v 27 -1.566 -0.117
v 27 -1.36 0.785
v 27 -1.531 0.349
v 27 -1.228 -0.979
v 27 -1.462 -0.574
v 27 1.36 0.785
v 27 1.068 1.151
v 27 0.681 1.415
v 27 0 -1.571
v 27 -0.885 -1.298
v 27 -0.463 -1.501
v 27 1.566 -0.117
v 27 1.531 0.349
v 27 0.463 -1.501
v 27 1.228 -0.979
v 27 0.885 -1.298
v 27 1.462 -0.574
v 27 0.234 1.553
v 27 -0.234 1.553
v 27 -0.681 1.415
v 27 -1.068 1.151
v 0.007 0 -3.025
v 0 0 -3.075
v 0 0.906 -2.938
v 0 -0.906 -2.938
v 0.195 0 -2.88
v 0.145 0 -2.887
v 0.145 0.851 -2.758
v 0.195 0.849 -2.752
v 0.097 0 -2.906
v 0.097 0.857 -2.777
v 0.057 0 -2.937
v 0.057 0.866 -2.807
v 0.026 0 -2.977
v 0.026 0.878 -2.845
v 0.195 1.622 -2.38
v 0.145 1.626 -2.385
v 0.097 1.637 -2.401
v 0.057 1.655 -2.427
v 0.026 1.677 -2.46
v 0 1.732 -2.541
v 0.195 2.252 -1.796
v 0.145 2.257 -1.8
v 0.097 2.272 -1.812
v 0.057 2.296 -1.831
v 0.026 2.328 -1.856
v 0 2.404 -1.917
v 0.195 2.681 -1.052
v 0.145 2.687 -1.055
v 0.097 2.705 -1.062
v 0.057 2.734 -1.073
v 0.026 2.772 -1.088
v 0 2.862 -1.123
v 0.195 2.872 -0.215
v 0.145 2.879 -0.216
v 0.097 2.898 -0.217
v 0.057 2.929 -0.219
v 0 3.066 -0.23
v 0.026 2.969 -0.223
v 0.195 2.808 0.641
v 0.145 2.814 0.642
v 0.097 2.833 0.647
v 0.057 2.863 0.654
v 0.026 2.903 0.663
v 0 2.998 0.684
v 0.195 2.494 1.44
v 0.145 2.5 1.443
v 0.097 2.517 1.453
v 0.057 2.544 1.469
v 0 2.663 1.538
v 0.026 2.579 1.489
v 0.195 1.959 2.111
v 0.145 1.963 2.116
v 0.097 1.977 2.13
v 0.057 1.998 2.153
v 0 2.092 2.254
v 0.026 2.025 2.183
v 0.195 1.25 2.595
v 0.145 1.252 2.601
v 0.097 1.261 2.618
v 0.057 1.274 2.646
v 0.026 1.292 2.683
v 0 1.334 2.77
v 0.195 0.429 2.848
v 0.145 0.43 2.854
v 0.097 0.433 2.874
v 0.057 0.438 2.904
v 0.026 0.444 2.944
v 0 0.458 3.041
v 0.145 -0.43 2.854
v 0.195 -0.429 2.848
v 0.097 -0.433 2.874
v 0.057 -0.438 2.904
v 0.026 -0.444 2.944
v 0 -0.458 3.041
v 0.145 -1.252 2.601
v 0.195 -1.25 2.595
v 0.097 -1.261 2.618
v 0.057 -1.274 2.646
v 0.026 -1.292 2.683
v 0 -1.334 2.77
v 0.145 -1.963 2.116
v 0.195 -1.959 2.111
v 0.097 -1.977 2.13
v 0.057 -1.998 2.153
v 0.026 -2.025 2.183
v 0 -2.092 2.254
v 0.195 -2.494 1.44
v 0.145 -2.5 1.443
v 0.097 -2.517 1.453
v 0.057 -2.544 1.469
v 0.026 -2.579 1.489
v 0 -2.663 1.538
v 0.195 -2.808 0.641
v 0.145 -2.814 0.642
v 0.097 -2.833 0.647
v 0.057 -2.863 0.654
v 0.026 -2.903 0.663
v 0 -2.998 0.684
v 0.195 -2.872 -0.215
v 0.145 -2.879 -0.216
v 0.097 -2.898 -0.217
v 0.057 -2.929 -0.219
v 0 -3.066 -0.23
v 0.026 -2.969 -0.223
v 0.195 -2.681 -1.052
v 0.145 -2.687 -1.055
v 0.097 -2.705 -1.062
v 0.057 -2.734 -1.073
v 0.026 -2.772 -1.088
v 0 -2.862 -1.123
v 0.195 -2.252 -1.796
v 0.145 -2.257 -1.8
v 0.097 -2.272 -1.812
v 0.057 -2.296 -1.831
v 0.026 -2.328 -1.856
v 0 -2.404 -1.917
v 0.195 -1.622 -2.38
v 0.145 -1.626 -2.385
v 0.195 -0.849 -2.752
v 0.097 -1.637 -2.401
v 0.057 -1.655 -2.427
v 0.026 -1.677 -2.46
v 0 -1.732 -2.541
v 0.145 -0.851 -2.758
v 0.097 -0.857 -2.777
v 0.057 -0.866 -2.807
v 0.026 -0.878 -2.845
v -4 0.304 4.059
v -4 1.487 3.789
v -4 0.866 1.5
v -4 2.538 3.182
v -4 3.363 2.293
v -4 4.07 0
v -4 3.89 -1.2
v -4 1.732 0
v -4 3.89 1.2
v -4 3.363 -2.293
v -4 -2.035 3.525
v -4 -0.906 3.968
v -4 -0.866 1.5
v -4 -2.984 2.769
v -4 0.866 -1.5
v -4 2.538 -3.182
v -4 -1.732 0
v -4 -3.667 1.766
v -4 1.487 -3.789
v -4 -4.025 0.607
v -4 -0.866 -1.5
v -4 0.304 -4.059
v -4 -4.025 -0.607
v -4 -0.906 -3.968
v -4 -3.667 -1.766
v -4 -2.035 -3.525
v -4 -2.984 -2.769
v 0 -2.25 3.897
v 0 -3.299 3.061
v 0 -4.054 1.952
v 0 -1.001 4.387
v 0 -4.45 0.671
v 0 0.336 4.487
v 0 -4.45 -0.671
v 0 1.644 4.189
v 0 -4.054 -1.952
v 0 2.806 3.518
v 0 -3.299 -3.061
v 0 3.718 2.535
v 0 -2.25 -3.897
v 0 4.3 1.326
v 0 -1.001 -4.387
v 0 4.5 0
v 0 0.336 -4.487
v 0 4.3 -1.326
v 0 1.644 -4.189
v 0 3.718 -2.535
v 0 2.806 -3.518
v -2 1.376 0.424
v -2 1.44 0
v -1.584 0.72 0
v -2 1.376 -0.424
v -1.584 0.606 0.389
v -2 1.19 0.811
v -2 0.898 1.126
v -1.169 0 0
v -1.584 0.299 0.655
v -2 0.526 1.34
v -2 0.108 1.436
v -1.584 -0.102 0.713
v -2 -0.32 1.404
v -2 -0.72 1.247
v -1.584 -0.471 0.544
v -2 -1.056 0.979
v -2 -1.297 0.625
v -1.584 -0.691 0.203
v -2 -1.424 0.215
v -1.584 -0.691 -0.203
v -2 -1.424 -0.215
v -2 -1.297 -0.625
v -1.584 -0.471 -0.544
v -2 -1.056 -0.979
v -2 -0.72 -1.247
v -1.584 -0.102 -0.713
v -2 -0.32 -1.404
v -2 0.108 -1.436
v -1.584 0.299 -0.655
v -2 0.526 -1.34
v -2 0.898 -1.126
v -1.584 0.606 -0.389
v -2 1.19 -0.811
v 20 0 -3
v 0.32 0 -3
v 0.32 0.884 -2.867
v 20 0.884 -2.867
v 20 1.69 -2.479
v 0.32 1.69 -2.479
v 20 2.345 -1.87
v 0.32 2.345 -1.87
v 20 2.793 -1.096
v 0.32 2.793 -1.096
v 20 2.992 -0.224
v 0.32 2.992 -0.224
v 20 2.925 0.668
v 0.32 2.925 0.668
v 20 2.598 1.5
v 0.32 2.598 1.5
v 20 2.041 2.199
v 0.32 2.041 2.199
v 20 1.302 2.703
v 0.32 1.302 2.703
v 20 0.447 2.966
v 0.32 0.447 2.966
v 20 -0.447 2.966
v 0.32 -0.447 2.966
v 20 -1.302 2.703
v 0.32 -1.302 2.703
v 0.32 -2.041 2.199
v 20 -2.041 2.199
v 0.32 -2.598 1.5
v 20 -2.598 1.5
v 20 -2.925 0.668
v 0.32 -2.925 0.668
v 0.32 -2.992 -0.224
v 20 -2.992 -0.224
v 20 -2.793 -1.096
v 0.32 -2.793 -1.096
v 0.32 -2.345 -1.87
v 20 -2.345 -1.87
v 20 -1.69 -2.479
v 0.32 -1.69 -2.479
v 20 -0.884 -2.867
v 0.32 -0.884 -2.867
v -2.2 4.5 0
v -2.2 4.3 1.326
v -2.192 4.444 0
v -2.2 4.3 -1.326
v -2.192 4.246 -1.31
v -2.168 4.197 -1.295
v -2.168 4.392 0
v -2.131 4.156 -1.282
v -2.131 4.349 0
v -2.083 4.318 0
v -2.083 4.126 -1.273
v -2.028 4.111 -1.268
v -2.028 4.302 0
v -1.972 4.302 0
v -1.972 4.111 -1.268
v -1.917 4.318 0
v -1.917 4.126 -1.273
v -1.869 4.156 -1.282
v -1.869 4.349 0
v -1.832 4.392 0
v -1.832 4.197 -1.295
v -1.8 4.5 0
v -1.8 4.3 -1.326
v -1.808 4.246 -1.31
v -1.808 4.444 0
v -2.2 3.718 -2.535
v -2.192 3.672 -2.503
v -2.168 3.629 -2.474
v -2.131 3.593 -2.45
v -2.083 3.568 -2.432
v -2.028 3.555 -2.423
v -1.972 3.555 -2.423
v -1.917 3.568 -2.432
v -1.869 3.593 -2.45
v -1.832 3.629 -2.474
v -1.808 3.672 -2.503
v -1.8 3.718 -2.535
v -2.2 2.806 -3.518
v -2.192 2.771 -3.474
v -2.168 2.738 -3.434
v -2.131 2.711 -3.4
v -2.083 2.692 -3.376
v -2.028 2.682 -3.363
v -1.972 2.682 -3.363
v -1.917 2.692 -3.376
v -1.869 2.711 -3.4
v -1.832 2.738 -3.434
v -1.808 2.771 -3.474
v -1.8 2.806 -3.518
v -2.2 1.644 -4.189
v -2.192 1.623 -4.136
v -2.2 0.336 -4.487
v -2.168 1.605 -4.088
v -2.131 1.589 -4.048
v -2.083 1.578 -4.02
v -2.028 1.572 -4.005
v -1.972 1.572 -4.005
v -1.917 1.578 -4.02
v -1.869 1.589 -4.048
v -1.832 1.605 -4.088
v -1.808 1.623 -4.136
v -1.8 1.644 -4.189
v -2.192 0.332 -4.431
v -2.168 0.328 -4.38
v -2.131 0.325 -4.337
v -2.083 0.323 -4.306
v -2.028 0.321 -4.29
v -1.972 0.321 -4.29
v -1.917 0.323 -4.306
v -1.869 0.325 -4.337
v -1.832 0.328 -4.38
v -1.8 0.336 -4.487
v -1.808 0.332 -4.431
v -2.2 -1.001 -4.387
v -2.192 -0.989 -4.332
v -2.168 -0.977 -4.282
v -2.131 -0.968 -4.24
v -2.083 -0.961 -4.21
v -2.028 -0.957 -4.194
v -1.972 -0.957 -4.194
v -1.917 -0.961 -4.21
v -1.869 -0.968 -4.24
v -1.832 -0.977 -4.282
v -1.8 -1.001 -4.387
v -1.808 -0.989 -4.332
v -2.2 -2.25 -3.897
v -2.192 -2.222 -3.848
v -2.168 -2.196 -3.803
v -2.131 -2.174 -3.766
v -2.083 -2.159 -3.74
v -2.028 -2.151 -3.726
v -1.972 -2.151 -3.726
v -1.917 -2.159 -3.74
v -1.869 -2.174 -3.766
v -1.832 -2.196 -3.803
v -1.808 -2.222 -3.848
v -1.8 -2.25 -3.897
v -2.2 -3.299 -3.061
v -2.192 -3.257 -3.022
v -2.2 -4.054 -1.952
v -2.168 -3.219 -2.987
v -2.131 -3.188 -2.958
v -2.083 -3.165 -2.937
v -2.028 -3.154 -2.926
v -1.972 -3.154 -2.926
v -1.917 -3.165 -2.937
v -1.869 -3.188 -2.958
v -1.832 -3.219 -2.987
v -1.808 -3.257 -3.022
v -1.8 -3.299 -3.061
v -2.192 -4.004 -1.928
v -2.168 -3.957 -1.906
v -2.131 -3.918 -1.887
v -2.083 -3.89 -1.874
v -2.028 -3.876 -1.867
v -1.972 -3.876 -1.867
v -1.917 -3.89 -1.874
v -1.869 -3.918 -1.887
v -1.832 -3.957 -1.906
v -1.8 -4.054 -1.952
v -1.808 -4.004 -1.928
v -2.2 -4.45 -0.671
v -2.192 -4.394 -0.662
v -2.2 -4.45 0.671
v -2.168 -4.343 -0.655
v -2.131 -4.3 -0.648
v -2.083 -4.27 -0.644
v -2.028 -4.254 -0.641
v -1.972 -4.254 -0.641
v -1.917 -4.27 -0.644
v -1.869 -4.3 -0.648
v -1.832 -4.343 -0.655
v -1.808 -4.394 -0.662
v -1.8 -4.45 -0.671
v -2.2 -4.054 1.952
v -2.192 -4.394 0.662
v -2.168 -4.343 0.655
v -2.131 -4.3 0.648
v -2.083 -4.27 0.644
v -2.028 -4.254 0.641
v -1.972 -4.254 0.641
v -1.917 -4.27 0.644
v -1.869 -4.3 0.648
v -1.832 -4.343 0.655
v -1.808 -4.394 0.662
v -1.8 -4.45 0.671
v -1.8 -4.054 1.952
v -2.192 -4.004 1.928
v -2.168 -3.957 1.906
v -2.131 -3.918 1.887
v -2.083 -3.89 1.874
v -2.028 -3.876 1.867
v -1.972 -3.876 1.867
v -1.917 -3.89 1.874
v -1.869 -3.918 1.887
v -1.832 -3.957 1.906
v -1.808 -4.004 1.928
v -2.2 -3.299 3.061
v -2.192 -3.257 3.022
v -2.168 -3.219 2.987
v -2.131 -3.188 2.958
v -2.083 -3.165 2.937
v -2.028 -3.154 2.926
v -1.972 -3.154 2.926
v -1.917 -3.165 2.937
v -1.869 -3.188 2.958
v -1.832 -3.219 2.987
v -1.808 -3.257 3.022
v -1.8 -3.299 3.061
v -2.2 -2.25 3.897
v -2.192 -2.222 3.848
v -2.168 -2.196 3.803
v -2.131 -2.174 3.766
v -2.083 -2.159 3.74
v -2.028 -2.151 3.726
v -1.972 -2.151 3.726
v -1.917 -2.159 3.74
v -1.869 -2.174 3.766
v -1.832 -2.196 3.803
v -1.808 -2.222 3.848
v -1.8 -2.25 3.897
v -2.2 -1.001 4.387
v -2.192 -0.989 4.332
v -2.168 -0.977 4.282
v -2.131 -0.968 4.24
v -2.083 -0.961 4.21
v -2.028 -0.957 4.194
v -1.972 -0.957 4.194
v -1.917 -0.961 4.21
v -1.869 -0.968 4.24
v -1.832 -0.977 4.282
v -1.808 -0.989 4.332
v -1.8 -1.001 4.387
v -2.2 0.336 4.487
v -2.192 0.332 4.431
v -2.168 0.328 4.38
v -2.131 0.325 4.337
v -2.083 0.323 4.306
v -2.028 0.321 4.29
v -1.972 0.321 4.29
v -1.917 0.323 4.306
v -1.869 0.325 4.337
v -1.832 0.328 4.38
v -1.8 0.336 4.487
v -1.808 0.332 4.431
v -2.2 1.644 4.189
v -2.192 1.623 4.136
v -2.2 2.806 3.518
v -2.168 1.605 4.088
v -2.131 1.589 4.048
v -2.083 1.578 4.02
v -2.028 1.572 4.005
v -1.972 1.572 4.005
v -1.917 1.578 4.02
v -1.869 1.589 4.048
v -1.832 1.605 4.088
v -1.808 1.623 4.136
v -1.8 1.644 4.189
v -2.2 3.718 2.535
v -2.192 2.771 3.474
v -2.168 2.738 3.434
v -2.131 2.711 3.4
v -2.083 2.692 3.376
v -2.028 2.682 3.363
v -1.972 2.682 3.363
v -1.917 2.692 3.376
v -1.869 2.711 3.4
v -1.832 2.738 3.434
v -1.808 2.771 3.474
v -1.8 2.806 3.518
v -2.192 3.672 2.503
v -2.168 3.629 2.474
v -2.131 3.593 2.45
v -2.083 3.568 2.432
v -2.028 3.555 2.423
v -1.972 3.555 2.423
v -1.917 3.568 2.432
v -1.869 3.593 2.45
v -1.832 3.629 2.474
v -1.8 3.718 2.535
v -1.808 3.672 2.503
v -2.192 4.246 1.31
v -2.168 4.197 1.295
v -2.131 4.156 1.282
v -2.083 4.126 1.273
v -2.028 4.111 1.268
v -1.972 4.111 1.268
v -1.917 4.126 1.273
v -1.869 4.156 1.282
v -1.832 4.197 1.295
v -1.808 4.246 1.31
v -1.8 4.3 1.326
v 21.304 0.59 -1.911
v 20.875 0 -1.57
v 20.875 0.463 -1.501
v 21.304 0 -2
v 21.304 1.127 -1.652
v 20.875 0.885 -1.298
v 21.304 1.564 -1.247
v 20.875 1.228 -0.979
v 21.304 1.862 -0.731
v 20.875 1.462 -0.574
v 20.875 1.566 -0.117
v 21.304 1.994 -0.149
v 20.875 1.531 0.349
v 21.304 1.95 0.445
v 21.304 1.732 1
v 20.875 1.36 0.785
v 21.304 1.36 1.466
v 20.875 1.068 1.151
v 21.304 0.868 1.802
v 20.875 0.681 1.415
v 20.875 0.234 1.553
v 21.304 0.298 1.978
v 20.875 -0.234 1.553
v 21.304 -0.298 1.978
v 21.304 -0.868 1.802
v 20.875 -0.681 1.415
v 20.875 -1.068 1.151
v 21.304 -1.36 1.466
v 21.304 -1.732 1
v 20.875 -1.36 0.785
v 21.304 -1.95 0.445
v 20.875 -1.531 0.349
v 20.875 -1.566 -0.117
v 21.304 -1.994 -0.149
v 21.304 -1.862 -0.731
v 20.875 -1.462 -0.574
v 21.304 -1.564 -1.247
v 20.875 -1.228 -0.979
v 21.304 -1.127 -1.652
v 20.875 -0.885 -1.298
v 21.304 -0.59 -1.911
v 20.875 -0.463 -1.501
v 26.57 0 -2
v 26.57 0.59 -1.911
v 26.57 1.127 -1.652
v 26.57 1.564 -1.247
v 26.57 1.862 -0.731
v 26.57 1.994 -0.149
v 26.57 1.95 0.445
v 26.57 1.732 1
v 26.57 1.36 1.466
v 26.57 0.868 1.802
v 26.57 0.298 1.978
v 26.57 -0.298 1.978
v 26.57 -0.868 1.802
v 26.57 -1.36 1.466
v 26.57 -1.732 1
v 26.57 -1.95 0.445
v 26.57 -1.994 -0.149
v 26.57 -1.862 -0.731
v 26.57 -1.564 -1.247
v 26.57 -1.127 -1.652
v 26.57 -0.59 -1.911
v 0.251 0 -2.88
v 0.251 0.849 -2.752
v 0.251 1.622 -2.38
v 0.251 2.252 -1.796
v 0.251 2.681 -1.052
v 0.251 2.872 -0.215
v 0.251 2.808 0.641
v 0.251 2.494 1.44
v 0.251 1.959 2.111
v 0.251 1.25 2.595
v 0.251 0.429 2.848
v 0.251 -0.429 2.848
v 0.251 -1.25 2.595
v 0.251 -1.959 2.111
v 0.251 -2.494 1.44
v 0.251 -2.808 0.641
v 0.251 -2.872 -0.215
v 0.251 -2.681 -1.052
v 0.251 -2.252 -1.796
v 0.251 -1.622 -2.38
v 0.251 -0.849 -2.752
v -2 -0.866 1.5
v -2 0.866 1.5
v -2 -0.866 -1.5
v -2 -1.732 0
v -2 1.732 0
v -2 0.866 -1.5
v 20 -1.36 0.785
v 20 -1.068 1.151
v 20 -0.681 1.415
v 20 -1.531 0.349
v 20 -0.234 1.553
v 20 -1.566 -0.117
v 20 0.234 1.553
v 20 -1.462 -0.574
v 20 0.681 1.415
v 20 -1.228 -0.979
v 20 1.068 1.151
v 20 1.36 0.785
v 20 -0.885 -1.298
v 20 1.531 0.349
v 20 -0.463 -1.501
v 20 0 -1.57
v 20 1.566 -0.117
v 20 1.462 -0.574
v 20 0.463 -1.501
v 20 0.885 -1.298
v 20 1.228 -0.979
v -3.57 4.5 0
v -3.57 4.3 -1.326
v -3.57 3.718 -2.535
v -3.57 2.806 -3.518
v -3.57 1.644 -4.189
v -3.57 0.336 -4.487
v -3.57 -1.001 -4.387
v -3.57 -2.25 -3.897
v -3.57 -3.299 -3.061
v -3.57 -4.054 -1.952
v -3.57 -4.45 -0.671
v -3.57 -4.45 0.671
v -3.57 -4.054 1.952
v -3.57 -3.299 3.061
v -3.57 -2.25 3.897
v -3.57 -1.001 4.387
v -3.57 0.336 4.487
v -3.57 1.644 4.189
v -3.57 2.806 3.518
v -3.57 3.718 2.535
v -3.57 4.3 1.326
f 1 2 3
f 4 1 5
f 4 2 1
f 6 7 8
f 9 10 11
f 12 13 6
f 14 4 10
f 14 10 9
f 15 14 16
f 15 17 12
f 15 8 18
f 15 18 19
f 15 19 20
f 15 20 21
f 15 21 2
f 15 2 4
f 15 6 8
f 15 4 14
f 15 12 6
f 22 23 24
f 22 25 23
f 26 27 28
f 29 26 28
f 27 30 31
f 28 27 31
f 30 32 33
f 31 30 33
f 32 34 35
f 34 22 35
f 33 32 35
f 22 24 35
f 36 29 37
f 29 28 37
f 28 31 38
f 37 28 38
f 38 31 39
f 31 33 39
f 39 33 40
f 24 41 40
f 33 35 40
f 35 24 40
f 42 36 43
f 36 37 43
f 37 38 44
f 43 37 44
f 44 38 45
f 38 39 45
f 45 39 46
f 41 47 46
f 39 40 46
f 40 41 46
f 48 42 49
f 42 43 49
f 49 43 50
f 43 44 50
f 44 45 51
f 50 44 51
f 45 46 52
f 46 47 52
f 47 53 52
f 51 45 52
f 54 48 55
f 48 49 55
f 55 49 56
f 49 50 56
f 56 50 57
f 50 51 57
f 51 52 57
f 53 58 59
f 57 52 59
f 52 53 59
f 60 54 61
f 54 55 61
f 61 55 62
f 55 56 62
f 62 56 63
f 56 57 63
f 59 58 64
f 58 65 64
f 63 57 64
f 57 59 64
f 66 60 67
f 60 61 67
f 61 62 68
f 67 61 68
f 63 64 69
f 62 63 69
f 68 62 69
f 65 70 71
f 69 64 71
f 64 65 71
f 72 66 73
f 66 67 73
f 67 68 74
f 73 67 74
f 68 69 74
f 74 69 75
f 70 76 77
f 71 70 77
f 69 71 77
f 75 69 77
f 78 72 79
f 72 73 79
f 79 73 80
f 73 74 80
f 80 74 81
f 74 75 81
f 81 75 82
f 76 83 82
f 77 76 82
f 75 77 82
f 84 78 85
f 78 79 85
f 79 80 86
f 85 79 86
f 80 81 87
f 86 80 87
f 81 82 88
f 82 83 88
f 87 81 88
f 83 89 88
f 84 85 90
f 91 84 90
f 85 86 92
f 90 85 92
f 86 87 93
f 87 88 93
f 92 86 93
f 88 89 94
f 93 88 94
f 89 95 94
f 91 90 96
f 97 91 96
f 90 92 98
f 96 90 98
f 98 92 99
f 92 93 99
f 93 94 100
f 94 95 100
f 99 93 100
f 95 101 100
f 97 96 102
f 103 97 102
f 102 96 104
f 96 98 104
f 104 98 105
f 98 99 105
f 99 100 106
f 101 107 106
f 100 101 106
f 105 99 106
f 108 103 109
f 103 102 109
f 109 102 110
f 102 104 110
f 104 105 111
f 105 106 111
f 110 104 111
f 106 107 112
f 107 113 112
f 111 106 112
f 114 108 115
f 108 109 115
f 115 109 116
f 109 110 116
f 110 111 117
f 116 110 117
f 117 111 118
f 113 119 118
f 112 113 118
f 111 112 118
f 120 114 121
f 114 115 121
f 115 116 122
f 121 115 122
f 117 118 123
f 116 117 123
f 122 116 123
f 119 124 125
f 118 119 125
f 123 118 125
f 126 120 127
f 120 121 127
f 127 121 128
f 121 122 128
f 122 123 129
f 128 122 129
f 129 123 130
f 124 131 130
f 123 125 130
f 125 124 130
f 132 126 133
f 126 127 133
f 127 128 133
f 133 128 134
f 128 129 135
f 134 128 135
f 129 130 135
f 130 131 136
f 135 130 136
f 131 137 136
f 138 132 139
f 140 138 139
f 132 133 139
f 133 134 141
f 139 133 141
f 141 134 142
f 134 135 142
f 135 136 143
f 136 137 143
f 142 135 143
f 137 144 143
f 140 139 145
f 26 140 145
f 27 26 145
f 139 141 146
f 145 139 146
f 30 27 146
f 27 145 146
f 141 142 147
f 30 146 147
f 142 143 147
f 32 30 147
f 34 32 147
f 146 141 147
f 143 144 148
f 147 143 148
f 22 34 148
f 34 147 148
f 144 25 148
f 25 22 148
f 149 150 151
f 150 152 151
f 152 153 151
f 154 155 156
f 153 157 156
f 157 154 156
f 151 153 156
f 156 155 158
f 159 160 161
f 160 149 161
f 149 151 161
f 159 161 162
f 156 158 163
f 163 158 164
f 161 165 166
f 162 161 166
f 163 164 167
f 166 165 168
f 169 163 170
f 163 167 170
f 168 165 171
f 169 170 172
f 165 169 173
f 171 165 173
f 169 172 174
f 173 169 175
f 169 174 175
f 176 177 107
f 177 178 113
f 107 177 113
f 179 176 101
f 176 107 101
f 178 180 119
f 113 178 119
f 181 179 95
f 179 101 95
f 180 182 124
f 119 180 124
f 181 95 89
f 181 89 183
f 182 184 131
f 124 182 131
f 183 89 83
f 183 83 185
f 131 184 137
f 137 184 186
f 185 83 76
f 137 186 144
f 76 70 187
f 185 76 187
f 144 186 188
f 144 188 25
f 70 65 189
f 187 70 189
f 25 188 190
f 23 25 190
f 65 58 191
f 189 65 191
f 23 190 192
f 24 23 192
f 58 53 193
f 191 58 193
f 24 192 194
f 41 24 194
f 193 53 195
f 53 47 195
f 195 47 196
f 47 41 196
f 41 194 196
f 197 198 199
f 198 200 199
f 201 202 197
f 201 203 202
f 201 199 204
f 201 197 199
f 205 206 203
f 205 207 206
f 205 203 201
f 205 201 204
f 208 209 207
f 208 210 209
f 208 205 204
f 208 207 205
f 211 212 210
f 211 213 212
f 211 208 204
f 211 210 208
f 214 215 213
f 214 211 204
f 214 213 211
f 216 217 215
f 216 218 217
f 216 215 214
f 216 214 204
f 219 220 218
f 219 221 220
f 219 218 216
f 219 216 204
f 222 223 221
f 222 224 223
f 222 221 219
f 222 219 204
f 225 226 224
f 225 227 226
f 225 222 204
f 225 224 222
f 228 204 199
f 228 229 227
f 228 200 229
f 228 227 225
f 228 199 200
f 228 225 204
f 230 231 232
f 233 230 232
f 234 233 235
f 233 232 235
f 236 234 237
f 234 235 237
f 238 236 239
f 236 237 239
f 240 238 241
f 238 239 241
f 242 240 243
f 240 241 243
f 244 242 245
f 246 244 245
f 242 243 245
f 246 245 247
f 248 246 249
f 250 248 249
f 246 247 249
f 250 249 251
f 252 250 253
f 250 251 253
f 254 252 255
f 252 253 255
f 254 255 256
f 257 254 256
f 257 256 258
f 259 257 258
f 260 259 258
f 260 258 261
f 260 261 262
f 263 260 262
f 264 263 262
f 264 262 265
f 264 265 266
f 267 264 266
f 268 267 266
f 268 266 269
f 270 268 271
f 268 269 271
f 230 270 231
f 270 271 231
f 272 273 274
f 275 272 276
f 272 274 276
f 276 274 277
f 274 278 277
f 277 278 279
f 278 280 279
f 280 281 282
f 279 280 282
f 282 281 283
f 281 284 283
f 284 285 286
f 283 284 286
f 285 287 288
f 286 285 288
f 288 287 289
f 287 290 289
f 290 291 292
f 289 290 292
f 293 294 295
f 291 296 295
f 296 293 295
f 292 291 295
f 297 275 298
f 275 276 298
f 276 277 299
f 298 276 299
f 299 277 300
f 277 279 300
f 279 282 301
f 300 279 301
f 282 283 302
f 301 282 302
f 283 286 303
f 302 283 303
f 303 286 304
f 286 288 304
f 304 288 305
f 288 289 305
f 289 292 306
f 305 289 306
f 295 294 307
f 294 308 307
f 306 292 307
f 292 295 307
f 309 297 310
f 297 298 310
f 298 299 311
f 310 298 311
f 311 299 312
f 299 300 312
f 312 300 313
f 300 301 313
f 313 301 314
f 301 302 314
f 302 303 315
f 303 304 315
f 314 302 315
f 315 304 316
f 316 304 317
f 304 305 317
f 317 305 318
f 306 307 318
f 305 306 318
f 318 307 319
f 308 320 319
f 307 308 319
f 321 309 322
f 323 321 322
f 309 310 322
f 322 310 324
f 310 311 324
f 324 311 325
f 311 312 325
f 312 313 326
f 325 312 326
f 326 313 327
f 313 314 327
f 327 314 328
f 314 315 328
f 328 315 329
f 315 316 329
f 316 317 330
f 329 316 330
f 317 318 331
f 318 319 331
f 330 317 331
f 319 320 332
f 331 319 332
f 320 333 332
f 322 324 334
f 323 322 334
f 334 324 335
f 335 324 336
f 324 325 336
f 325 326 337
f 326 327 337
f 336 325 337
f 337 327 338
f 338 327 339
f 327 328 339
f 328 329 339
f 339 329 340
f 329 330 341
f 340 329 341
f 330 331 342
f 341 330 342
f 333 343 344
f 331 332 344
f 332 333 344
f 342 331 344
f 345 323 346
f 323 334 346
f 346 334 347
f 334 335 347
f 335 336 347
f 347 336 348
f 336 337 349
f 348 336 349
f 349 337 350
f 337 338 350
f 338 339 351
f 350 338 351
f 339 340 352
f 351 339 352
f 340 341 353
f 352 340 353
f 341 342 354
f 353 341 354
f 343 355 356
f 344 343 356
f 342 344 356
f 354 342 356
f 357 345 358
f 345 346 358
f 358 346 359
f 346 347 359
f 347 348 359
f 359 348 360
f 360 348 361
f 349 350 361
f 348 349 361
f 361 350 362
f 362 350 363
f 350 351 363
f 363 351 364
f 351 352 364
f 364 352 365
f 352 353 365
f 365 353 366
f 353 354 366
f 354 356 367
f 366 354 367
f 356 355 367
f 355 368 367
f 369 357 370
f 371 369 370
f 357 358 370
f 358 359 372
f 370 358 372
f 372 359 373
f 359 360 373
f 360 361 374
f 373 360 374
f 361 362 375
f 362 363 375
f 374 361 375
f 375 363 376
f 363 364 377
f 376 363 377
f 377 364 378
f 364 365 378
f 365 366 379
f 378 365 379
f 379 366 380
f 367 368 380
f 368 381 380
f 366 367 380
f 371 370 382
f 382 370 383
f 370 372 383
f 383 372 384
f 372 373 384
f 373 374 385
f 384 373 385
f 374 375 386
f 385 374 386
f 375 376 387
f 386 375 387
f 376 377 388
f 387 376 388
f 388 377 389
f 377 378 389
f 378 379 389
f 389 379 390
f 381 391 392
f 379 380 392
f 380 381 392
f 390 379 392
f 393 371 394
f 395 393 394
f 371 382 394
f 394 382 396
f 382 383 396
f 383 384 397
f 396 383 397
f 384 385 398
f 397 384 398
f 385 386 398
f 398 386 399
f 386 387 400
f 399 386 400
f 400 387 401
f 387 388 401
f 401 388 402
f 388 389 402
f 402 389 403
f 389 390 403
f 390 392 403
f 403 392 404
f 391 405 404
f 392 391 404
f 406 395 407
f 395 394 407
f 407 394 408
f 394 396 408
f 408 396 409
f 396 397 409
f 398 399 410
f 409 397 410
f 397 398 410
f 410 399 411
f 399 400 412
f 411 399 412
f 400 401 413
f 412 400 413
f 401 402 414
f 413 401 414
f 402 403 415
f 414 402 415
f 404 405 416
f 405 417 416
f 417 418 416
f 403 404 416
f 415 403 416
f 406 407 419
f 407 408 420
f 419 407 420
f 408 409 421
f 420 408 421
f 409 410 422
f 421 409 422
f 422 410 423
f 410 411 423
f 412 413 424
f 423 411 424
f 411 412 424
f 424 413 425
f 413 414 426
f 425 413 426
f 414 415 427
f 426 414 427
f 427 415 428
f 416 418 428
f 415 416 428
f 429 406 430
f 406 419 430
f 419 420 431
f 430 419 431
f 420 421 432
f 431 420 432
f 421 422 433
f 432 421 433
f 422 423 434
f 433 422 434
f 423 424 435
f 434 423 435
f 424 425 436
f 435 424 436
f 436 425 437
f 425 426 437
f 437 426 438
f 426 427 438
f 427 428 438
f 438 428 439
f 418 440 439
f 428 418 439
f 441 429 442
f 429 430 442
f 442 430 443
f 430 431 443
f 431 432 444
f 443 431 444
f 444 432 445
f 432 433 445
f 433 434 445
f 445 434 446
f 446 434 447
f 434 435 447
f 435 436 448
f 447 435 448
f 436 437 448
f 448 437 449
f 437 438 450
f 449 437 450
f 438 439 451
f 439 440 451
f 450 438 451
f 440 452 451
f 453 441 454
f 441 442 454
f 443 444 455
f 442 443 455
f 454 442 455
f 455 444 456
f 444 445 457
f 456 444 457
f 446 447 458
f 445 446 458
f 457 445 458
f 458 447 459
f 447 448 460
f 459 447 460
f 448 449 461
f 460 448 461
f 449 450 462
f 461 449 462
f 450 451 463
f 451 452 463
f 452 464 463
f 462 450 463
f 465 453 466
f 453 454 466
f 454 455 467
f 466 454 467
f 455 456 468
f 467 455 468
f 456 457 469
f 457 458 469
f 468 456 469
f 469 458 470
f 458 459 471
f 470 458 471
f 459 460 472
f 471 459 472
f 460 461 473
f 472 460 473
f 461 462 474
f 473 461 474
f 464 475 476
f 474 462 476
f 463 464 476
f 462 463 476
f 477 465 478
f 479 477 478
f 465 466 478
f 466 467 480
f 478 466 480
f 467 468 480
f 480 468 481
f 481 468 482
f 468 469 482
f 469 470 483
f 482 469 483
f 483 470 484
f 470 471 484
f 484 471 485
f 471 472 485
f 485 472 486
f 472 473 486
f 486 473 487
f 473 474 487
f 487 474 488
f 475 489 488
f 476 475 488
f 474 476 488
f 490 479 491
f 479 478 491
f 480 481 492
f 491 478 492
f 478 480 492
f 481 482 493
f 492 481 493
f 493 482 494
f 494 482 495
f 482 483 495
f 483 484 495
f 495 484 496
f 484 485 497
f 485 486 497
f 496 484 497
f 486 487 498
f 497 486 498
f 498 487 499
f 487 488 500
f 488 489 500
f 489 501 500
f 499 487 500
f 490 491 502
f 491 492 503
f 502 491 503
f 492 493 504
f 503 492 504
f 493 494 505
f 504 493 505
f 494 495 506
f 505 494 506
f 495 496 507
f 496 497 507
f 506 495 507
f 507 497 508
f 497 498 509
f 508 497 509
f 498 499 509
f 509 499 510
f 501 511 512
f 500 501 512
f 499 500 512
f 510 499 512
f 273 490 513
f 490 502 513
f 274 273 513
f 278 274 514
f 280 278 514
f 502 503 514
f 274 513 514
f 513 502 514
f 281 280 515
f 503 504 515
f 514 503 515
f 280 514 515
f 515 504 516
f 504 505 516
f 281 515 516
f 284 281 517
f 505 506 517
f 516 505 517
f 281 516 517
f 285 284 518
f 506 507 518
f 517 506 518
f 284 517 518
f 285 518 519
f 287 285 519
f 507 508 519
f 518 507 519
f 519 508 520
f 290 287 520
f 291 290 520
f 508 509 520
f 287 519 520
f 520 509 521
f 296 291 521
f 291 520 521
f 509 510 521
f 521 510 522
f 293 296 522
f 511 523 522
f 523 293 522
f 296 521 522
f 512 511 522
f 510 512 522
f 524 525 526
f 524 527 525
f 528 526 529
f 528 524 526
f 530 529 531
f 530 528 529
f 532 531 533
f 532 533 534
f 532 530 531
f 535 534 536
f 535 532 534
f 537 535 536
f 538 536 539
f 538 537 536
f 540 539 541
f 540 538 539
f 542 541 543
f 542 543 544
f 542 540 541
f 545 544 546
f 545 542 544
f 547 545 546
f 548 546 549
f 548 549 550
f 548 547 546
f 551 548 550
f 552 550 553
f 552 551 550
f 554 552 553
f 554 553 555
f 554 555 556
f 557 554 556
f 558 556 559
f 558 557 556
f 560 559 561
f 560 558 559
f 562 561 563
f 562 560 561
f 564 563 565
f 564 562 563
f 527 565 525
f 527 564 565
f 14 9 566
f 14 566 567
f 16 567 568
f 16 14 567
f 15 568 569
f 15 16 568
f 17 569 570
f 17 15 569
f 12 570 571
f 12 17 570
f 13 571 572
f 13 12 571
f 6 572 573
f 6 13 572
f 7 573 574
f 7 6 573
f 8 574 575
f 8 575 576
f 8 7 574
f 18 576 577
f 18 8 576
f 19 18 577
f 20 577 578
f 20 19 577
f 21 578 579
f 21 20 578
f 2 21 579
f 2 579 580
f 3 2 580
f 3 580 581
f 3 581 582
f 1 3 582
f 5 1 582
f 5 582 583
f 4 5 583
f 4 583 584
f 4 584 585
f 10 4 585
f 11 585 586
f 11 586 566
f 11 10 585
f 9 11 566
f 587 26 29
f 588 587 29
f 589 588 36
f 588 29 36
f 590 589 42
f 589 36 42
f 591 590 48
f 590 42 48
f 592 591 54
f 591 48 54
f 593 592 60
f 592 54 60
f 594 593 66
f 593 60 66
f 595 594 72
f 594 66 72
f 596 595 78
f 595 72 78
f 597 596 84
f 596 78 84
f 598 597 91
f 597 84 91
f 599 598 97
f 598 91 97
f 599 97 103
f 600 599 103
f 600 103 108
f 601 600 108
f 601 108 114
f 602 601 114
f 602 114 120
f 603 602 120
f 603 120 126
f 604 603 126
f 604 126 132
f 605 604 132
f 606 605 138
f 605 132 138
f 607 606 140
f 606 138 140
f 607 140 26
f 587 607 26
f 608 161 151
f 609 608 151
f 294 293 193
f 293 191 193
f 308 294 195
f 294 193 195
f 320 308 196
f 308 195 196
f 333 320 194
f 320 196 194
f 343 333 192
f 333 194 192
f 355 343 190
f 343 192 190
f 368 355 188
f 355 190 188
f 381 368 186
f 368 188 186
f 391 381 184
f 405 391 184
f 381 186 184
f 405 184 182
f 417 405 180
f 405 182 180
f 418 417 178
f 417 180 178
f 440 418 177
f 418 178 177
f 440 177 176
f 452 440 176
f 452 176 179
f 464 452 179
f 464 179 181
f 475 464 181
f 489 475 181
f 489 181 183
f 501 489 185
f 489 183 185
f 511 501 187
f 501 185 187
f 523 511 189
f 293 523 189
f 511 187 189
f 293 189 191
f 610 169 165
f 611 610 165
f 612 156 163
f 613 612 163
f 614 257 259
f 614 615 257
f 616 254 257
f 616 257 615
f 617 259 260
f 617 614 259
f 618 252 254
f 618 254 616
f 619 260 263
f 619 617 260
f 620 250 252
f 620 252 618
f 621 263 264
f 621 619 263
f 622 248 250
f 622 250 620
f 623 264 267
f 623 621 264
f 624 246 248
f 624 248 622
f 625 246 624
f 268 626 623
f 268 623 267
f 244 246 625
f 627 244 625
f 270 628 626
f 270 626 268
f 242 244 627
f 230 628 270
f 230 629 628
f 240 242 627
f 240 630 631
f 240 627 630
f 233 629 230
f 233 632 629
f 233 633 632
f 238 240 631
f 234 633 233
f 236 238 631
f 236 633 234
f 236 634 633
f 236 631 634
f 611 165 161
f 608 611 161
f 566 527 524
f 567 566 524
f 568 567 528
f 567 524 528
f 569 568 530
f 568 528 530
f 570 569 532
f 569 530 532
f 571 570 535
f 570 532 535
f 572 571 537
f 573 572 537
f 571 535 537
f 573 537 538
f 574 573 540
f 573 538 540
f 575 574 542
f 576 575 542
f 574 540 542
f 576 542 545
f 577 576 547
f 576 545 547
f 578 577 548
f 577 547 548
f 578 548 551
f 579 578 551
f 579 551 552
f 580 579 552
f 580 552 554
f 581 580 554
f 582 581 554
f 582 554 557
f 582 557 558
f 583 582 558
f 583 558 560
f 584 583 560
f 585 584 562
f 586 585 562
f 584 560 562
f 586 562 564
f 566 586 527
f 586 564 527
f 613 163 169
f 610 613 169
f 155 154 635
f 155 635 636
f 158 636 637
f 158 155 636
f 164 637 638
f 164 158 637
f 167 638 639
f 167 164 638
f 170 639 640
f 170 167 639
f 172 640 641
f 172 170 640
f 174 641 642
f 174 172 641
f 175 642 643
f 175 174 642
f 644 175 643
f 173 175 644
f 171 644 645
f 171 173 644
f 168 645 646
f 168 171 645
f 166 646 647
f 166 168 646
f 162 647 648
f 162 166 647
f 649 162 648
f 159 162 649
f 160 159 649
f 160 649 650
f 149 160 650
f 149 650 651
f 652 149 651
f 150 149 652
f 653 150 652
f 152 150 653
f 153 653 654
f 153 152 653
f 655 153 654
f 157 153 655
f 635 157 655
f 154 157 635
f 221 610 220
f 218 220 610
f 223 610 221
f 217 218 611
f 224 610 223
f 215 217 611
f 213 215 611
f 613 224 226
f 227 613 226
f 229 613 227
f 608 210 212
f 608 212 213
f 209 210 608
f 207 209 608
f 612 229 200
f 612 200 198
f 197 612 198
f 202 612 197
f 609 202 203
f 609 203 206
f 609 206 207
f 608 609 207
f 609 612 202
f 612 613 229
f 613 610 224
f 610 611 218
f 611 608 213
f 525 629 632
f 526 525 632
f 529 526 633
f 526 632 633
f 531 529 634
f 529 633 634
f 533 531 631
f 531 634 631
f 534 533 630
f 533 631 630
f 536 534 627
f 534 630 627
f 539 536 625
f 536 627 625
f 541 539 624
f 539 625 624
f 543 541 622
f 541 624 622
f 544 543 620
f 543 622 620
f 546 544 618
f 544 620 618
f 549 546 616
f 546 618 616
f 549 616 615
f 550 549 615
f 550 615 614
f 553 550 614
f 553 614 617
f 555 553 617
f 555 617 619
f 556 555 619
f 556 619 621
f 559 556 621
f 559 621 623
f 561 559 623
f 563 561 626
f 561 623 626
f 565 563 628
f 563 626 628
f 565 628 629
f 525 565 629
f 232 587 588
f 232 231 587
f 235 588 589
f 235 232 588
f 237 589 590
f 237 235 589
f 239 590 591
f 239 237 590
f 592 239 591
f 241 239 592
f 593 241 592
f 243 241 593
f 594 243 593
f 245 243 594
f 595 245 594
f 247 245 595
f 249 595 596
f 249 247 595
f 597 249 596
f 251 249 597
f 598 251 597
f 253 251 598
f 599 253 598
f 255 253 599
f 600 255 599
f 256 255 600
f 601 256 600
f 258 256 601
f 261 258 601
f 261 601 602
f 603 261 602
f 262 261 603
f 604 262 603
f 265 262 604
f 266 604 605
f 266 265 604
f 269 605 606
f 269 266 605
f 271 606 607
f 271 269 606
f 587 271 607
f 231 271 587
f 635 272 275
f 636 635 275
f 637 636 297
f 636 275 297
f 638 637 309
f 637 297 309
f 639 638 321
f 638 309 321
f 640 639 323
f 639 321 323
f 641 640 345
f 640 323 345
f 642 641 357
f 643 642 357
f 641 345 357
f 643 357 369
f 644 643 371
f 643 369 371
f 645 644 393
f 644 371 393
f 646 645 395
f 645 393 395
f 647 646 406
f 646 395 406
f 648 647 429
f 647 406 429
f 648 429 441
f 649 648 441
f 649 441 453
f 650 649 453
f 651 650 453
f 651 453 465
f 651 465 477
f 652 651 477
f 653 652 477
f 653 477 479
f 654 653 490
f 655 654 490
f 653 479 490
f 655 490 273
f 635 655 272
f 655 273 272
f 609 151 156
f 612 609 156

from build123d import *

# Parameters (mm, degrees)
SKETCH2_R           = 2.88
BOSS_EXTRUDE1_DEPTH = 0.250717968
SKETCH3_R           = 2.88
BOSS_EXTRUDE2_DEPTH = 0.069282032
BOSS_EXTRUDE2_TAPER = -60.000000004
SKETCH4_R           = 3
BOSS_EXTRUDE3_DEPTH = 19.68
SKETCH5_R           = 1.5705
BOSS_EXTRUDE4_DEPTH = 0.875
SKETCH6_R           = 1.5705
BOSS_EXTRUDE5_DEPTH = 0.4295
BOSS_EXTRUDE5_TAPER = -45
SKETCH7_R           = 2
BOSS_EXTRUDE6_DEPTH = 5.6955
CUT_EXTRUDE1_DEPTH  = 2
CHAMFER1_SIZE       = 0.4295
FILLET1_R           = 0.195


with BuildPart() as part:
    # Sketch1 → Revolve1 (revolve)
    with BuildSketch(Plane(origin=(0, 0, 0), x_dir=(-1, 0, 0), z_dir=(0, 0, -1))):
        with BuildLine():
            Line((0, 4.5), (0, 0))
            Line((0, 0), (4, 0))
            Line((4, 0), (4, 4.5))
            Line((4, 4.5), (2.2, 4.5))
            ThreePointArc((2.2, 4.5), (2, 4.3), (1.8, 4.5))
            Line((1.8, 4.5), (0, 4.5))
        make_face()
    revolve(axis=Axis((0, 0, 0), (-1, 0, 0)))

    # Sketch2 → Boss-Extrude1 (add)
    with BuildSketch(Plane(origin=(0, 0, 0), x_dir=(0, 0, -1), z_dir=(1, 0, 0))):
        Circle(SKETCH2_R)
    extrude(amount=BOSS_EXTRUDE1_DEPTH)

    # Sketch3 → Boss-Extrude2 (add)
    with BuildSketch(Plane(origin=(0.250717968, 0, 0), x_dir=(0, 0, -1), z_dir=(1, 0, 0))):
        Circle(SKETCH3_R)
    extrude(amount=BOSS_EXTRUDE2_DEPTH, taper=BOSS_EXTRUDE2_TAPER)

    # Sketch4 → Boss-Extrude3 (add)
    with BuildSketch(Plane(origin=(0.32, 0, 0), x_dir=(0, 0, -1), z_dir=(1, 0, 0))):
        Circle(SKETCH4_R)
    extrude(amount=BOSS_EXTRUDE3_DEPTH)

    # Sketch5 → Boss-Extrude4 (add)
    with BuildSketch(Plane(origin=(20, 0, 0), x_dir=(0, 0, -1), z_dir=(1, 0, 0))):
        Circle(SKETCH5_R)
    extrude(amount=BOSS_EXTRUDE4_DEPTH)

    # Sketch6 → Boss-Extrude5 (add)
    with BuildSketch(Plane(origin=(20.875, 0, 0), x_dir=(0, 0, -1), z_dir=(1, 0, 0))):
        Circle(SKETCH6_R)
    extrude(amount=BOSS_EXTRUDE5_DEPTH, taper=BOSS_EXTRUDE5_TAPER)

    # Sketch7 → Boss-Extrude6 (add)
    with BuildSketch(Plane(origin=(21.3045, 0, 0), x_dir=(0, 0, -1), z_dir=(1, 0, 0))):
        Circle(SKETCH7_R)
    extrude(amount=BOSS_EXTRUDE6_DEPTH)

    # Sketch8 → Cut-Extrude1 (cut)
    with BuildSketch(Plane.ZY.offset(4)):
        Polygon((1.5, -0.866025404), (1.5, 0.866025404), (0, 1.732050808), (-1.5, 0.866025404), (-1.5, -0.866025404), (0, -1.732050808), align=None)
    extrude(amount=-CUT_EXTRUDE1_DEPTH, mode=Mode.SUBTRACT)

    # Sketch9 → Cut-Revolve1 (revolve, cut)
    with BuildSketch(Plane.XY):
        Polygon((-2, 1.44), (-2, 0), (-1.168615612, 0), align=None)
    revolve(axis=Axis((-2, 0, 0), (1, 0, 0)), mode=Mode.SUBTRACT)

    # Chamfer1
    chamfer1_edges = [part.edges().sort_by_distance(p)[0] for p in [
        (27, 0, 2),
        (-4, -4.5, 0),
    ]]
    chamfer(chamfer1_edges, length=CHAMFER1_SIZE)

    # Fillet1
    fillet1_edges = [part.edges().sort_by_distance(p)[0] for p in [
        (0, 0, 2.88),
    ]]
    fillet(fillet1_edges, radius=FILLET1_R)


solid = part.part
